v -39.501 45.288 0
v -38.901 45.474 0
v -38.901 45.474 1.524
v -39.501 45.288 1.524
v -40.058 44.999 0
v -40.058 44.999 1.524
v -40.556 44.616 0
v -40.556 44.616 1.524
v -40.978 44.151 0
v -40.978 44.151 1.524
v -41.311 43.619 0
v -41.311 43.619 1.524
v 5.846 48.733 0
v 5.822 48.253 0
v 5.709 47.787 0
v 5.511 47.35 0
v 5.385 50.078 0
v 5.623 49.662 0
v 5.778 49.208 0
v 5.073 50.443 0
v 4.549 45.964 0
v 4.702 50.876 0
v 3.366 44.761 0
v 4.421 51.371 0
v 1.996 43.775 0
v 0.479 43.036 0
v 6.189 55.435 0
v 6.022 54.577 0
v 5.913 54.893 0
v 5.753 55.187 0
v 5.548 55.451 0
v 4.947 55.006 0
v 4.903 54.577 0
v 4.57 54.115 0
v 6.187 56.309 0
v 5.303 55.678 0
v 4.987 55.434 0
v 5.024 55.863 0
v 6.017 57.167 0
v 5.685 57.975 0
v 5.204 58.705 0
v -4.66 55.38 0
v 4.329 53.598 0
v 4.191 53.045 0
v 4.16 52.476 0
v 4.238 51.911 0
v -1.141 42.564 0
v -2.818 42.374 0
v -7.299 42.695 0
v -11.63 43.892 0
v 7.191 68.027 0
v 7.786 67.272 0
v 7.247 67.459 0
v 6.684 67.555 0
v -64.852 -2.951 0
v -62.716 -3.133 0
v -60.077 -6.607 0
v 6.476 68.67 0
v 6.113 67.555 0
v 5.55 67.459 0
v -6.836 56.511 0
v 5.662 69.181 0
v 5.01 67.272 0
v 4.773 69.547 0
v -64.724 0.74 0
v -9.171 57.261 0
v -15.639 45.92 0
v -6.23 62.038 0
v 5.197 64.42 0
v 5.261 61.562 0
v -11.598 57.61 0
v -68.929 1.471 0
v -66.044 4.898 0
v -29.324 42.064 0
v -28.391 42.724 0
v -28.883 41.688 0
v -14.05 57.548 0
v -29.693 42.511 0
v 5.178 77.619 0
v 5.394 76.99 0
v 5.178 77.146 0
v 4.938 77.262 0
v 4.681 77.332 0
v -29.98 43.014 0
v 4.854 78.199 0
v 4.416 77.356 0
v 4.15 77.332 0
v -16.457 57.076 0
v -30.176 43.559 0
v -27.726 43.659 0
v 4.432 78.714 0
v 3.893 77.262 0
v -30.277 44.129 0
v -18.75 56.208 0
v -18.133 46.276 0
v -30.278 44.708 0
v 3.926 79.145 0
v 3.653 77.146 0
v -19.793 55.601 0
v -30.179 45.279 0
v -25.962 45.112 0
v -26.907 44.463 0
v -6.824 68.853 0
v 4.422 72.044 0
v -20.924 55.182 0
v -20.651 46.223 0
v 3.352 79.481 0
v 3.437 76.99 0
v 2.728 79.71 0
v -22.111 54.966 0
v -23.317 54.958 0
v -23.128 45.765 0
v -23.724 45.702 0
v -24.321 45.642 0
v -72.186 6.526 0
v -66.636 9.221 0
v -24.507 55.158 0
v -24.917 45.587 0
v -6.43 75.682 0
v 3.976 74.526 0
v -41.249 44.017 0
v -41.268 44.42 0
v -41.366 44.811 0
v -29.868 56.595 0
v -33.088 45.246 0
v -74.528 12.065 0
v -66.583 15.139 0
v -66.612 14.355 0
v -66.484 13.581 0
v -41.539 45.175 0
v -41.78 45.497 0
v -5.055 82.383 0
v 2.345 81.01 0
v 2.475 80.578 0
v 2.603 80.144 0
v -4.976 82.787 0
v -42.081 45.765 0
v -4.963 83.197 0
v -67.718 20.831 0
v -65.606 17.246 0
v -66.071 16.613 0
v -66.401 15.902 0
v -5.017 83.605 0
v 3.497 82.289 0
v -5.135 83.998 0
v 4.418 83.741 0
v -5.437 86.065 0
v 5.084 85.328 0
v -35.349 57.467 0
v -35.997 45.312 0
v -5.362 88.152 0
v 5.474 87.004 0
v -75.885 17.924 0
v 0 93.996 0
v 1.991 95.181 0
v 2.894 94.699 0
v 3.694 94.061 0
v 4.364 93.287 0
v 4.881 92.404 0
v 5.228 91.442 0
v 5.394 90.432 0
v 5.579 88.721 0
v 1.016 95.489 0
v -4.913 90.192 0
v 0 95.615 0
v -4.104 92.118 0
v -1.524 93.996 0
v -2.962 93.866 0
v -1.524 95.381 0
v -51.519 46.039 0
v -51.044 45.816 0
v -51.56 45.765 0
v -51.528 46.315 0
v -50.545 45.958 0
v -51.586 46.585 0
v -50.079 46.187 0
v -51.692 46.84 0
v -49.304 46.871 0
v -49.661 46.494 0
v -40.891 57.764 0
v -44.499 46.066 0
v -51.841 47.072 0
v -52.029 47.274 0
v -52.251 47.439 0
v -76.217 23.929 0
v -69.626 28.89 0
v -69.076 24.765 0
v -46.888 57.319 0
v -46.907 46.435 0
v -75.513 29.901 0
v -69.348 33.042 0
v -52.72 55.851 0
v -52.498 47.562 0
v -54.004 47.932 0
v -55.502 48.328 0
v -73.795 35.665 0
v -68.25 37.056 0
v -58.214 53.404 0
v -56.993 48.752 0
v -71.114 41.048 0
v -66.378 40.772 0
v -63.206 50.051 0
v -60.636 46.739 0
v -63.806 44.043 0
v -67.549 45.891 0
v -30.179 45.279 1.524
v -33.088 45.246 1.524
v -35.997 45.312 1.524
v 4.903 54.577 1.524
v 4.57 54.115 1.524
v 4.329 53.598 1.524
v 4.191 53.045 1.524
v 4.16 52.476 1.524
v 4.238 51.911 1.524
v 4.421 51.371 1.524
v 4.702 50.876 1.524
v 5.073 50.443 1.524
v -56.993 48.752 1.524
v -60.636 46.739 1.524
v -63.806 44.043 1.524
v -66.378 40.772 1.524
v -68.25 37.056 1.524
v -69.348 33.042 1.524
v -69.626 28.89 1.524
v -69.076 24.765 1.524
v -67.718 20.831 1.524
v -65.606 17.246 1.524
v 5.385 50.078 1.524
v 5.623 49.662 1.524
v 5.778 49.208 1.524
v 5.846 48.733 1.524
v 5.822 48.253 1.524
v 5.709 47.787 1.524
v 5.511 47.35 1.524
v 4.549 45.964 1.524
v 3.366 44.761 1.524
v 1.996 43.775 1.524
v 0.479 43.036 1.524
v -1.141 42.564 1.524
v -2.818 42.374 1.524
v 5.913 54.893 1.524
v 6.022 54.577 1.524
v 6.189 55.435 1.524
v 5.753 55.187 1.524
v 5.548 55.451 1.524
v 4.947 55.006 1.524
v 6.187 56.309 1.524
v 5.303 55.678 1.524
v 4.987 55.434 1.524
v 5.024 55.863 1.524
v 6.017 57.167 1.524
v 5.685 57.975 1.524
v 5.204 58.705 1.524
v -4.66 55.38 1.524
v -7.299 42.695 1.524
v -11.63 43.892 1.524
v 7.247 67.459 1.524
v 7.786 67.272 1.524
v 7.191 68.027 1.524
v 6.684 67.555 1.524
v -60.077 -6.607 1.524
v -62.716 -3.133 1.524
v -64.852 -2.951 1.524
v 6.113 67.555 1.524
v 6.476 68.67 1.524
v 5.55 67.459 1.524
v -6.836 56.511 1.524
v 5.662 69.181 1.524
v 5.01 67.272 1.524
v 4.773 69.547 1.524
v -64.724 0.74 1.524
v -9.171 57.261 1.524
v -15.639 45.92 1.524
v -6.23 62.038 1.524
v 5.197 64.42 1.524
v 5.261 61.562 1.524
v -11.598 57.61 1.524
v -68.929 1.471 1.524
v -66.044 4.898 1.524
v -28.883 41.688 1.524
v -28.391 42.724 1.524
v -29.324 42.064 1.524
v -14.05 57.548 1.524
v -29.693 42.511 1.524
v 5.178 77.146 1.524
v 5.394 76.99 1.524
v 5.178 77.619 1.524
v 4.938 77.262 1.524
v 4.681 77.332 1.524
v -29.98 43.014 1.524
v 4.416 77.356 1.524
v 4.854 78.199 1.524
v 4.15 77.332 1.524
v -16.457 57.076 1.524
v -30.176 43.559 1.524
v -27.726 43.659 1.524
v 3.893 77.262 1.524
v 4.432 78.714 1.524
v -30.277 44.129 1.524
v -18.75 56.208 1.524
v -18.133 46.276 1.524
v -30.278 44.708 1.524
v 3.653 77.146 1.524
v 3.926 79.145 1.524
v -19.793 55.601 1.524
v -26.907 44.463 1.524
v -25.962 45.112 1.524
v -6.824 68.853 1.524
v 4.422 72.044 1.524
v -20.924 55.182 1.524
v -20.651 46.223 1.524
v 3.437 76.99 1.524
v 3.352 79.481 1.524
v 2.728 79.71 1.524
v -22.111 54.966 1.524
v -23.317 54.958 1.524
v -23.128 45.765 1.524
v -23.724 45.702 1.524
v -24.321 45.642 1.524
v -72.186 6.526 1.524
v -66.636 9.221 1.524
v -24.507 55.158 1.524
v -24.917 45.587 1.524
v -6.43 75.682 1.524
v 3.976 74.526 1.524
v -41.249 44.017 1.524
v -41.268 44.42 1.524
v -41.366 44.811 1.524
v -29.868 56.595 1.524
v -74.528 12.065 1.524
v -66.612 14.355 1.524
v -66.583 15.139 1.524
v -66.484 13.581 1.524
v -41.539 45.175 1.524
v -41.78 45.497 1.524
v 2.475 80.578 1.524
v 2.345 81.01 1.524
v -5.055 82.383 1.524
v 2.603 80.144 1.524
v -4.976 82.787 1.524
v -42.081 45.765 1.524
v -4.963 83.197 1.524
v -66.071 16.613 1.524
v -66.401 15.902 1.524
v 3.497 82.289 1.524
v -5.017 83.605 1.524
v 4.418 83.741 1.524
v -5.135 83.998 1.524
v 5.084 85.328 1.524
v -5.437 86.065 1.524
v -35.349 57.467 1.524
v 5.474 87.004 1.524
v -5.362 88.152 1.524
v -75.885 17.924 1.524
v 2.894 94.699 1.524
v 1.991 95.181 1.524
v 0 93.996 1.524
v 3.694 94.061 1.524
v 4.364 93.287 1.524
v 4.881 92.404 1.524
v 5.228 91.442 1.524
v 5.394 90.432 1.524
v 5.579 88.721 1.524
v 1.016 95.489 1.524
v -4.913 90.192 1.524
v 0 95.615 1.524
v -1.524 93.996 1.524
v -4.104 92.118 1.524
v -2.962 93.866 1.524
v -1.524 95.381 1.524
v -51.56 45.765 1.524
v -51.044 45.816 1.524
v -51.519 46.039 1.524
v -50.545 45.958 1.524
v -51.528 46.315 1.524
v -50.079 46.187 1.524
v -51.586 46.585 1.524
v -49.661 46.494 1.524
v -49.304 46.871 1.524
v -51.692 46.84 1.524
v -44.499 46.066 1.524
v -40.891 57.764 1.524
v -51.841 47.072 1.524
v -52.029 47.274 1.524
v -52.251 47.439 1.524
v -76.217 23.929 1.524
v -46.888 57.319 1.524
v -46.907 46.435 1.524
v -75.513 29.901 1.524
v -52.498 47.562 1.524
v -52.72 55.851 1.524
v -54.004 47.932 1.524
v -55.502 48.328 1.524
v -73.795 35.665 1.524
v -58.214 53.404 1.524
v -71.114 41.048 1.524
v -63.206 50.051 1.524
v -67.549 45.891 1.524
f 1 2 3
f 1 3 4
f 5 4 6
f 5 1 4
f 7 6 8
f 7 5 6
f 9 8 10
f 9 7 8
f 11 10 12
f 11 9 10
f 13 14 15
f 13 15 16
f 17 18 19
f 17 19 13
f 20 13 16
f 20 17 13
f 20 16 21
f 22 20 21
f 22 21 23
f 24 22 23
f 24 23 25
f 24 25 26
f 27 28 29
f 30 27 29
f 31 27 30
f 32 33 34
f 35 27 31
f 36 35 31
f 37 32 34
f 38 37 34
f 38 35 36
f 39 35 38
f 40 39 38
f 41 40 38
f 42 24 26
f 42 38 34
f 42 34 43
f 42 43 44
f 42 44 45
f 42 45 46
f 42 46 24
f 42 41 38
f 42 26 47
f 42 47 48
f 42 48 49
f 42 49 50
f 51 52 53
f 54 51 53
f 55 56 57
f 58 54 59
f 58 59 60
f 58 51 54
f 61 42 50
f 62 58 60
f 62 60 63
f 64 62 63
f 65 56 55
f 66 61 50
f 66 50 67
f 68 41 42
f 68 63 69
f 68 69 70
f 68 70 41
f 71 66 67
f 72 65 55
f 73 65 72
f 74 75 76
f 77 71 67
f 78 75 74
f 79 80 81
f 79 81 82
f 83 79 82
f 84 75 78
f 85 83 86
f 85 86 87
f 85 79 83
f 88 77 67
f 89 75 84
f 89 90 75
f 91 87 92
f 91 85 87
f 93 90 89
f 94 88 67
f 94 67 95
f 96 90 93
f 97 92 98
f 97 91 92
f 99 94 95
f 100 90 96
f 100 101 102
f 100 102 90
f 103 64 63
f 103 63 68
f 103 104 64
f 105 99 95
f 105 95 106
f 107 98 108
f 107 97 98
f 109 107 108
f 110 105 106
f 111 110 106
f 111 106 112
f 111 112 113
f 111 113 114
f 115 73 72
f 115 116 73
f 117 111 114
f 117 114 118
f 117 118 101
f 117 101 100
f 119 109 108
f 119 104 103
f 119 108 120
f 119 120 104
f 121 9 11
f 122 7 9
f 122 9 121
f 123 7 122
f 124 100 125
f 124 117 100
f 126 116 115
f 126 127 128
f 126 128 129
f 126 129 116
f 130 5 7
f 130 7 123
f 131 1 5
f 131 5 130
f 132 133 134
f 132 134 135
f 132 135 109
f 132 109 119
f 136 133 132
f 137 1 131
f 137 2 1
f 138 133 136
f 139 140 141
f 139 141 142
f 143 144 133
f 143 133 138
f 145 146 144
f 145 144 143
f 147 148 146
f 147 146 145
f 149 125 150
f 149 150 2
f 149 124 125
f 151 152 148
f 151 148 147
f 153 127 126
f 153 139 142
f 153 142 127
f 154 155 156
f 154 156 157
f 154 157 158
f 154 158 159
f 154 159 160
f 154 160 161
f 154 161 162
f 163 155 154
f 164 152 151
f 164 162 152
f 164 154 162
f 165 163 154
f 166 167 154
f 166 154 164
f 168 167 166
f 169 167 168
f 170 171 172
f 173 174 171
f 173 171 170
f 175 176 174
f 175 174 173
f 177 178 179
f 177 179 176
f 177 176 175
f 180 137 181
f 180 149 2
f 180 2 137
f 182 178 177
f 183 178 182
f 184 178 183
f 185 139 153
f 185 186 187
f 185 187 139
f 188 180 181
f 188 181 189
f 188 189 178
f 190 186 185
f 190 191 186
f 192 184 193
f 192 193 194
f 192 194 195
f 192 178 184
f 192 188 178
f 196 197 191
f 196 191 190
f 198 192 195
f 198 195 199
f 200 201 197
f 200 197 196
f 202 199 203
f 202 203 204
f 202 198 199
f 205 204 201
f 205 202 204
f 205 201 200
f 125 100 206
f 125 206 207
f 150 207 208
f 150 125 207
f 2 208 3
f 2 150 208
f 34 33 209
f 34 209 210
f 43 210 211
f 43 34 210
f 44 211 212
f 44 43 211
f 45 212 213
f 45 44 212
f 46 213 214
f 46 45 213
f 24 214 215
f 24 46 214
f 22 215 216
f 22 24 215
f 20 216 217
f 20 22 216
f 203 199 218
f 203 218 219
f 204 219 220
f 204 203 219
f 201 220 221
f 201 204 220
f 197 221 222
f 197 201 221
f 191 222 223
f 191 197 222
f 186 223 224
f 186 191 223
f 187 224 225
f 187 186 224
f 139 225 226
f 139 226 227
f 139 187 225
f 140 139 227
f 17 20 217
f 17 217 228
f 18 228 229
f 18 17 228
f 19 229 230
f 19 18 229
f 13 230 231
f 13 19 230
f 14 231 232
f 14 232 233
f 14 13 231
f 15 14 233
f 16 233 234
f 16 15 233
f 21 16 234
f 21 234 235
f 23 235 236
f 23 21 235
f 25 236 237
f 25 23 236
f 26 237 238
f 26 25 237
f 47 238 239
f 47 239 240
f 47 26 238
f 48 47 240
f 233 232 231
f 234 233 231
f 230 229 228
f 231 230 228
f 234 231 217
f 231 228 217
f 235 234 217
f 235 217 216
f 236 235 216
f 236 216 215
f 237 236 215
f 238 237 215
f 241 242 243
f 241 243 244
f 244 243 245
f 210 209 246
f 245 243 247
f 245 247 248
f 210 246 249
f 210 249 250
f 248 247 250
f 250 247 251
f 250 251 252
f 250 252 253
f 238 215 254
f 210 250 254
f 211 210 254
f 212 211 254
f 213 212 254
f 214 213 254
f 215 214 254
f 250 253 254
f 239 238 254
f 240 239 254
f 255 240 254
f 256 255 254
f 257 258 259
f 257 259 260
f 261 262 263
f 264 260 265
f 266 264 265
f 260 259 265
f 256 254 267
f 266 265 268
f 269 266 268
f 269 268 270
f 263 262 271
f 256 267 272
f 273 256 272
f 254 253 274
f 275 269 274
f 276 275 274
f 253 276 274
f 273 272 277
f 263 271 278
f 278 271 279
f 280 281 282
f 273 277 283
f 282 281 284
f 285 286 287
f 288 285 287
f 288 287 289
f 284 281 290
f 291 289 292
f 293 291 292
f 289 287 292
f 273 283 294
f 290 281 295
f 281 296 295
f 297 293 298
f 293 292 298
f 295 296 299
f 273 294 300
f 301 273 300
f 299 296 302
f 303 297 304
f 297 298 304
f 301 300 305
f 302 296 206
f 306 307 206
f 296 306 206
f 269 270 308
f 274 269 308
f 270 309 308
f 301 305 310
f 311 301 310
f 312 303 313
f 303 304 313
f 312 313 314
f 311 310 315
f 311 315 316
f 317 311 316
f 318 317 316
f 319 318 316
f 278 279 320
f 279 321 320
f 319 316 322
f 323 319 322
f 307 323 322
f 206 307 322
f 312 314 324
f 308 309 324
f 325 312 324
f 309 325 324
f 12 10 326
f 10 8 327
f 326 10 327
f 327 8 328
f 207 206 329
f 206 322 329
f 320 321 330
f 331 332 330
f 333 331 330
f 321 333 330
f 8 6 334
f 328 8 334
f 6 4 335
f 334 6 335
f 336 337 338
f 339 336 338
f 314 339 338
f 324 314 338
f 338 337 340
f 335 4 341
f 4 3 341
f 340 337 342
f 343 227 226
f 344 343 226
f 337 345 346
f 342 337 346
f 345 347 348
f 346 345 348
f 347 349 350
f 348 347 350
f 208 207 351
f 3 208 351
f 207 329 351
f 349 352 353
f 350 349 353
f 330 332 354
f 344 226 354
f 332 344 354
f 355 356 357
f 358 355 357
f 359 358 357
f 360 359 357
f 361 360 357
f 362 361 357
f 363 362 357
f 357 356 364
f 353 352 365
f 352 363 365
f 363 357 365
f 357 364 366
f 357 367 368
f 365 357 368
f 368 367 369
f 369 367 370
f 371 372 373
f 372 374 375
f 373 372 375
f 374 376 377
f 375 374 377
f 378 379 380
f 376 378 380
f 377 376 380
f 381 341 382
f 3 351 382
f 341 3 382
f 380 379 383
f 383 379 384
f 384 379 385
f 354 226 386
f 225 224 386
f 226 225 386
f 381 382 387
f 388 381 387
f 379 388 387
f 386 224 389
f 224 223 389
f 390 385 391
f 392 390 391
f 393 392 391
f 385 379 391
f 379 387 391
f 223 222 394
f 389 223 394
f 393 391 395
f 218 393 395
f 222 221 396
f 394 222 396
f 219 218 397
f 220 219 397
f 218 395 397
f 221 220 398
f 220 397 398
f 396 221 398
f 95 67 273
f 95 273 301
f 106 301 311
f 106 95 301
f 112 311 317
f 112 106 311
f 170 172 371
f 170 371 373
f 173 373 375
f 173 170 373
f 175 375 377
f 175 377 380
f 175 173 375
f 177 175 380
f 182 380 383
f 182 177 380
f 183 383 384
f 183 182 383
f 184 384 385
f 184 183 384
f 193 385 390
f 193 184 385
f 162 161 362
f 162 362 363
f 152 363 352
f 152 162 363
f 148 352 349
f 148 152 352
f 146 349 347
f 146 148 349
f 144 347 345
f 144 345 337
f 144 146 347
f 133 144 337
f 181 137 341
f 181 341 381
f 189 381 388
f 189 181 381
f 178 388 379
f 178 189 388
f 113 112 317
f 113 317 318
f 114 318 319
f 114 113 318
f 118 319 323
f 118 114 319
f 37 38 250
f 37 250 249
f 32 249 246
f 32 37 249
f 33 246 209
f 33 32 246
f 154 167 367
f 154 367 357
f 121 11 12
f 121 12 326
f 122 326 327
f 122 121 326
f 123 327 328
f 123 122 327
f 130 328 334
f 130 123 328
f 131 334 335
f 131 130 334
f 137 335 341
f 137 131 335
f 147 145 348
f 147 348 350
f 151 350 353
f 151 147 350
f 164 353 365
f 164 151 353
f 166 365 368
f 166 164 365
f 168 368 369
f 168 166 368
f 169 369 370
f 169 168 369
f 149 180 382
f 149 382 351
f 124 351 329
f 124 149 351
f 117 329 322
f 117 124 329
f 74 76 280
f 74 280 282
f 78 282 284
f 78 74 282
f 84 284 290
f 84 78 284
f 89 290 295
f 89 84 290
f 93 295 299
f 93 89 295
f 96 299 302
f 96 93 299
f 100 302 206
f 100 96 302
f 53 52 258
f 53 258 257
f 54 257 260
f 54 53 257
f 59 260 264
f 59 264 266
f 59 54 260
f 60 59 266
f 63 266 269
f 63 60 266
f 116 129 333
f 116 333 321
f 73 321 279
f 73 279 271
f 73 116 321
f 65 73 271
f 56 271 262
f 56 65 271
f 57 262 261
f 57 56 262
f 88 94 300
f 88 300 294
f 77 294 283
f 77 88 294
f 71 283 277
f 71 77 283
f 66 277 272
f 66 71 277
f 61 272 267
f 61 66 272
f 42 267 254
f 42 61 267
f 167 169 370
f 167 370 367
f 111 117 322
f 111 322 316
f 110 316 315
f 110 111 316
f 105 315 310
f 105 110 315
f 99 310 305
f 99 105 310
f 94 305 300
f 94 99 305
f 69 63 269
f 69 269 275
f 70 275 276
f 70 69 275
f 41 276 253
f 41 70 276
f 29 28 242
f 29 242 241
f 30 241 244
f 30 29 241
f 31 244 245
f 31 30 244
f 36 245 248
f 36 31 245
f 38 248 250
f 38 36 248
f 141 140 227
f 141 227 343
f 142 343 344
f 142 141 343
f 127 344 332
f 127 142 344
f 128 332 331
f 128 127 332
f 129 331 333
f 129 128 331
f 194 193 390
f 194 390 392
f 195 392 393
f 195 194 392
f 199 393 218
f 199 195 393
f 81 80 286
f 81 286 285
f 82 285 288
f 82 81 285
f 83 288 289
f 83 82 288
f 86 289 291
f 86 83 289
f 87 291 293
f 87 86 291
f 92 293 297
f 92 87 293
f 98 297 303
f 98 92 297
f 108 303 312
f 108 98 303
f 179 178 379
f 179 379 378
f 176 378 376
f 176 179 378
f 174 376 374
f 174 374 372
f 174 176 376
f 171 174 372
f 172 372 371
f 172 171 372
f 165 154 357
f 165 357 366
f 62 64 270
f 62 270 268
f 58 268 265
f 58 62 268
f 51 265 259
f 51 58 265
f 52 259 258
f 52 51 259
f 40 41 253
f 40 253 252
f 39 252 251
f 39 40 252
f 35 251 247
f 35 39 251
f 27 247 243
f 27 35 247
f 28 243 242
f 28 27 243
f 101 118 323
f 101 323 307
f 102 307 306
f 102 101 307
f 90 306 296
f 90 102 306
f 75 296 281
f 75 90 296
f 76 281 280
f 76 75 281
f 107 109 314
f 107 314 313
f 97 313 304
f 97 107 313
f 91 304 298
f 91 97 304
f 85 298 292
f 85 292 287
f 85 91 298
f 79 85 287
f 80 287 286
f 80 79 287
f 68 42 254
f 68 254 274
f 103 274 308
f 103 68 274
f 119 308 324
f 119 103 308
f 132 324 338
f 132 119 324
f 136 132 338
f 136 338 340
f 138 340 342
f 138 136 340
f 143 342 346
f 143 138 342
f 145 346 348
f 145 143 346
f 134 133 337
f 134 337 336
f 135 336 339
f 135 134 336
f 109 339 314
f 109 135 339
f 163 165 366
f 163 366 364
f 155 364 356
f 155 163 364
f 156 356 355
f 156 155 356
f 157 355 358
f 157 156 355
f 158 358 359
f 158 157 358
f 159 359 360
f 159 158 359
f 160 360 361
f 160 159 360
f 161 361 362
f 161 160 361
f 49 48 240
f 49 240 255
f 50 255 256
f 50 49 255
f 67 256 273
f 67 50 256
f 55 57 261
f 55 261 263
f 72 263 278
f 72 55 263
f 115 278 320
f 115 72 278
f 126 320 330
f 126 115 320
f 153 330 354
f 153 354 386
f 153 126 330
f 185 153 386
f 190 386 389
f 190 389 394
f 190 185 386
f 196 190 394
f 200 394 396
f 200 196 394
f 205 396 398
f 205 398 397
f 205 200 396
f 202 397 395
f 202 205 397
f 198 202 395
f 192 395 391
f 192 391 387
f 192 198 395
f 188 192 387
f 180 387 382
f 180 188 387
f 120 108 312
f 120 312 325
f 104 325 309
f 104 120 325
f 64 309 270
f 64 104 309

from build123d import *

# Parameters (mm, degrees)
BOSS_EXTRUDE1_DEPTH = 1.524


with BuildPart() as part:
    # Sketch1 → Boss-Extrude1 (new body)
    with BuildSketch(Plane.XY):
        with BuildLine():
            Line((-1.524, 93.996264428), (0, 93.996264428))
            Line((0, 93.996264428), (0, 95.614927588))
            ThreePointArc((0, 95.614927588), (3.693748092, 94.060684173), (5.394313408, 90.431975702))
            ThreePointArc((5.394313408, 90.431975702), (5.083870366, 85.328096728), (2.344513216, 81.010472628))
            ThreePointArc((2.344513216, 81.010472628), (2.539372179, 80.361029228), (2.727630661, 79.709641871))
            ThreePointArc((2.727630661, 79.709641871), (4.432053028, 78.713510624), (5.394313408, 76.989739169))
            ThreePointArc((5.394313408, 76.989739169), (4.415817963, 77.356115064), (3.437322519, 76.989739169))
            ThreePointArc((3.437322519, 76.989739169), (4.210597619, 73.287177771), (4.773115775, 69.546791613))
            ThreePointArc((4.773115775, 69.546791613), (6.476278237, 68.669820648), (7.786173006, 67.271959374))
            ThreePointArc((7.786173006, 67.271959374), (6.398187856, 67.566469165), (5.010202706, 67.271959374))
            ThreePointArc((5.010202706, 67.271959374), (5.244344787, 62.991455343), (5.203509677, 58.704746843))
            ThreePointArc((5.203509677, 58.704746843), (6.122995482, 56.742128292), (6.022449708, 54.577130307))
            ThreePointArc((6.022449708, 54.577130307), (5.656055769, 55.32299802), (5.02447468, 55.863061433))
            ThreePointArc((5.02447468, 55.863061433), (4.967033142, 55.219803245), (4.903376867, 54.577130307))
            ThreePointArc((4.903376867, 54.577130307), (4.160208316, 52.476052404), (5.072854771, 50.442851897))
            ThreePointArc((5.072854771, 50.442851897), (5.82334848, 48.971843275), (5.510783631, 47.350297597))
            ThreePointArc((5.510783631, 47.350297597), (1.996073925, 43.775155466), (-2.817678827, 42.374223627))
            ThreePointArc((-2.817678827, 42.374223627), (-9.49417325, 43.186036631), (-15.638900273, 45.92043747))
            ThreePointArc((-15.638900273, 45.92043747), (-19.39296862, 46.30049438), (-23.12808354, 45.765341186))
            ThreePointArc((-23.12808354, 45.765341186), (-24.022277431, 45.671562771), (-24.917397051, 45.587076243))
            ThreePointArc((-24.917397051, 45.587076243), (-27.334149164, 44.07870078), (-28.883355756, 41.687917174))
            ThreePointArc((-28.883355756, 41.687917174), (-30.089948499, 43.281908325), (-30.179098122, 45.279087881))
            ThreePointArc((-30.179098122, 45.279087881), (-34.542573171, 45.266801777), (-38.901124358, 45.474399945))
            ThreePointArc((-38.901124358, 45.474399945), (-40.315710263, 44.818959656), (-41.31100161, 43.61893866))
            ThreePointArc((-41.31100161, 43.61893866), (-41.365656867, 44.810730455), (-42.081209312, 45.765371529))
            ThreePointArc((-42.081209312, 45.765371529), (-45.704386877, 46.241994184), (-49.304220896, 46.871104556))
            ThreePointArc((-49.304220896, 46.871104556), (-50.306617349, 46.062069726), (-51.560134873, 45.765371529))
            ThreePointArc((-51.560134873, 45.765371529), (-51.69154215, 46.839952524), (-52.498251339, 47.561902989))
            ThreePointArc((-52.498251339, 47.561902989), (-54.753856575, 48.126581404), (-56.993482586, 48.751635021))
            ThreePointArc((-56.993482586, 48.751635021), (-68.899192265, 35.07600442), (-65.606179776, 17.245556751))
            ThreePointArc((-65.606179776, 17.245556751), (-66.511011599, 15.524715569), (-66.48442613, 13.580671275))
            ThreePointArc((-66.48442613, 13.580671275), (-65.472964, 2.7909779), (-60.077247453, -6.607255003))
            ThreePointArc((-60.077247453, -6.607255003), (-74.778475075, 32.819889944), (-40.89052168, 57.764477873))
            ThreePointArc((-40.89052168, 57.764477873), (-32.596685646, 57.102075632), (-24.506779764, 55.157875102))
            ThreePointArc((-24.506779764, 55.157875102), (-21.512905256, 55.048508832), (-18.750408328, 56.207756982))
            ThreePointArc((-18.750408328, 56.207756982), (-11.598379652, 57.610020261), (-4.659613728, 55.380360214))
            ThreePointArc((-4.659613728, 55.380360214), (-6.824036174, 68.85301684), (-5.055416365, 82.38332301))
            ThreePointArc((-5.055416365, 82.38332301), (-4.963334277, 83.197390982), (-5.135176923, 83.998425237))
            ThreePointArc((-5.135176923, 83.998425237), (-4.912918532, 90.191927066), (-1.524, 95.380770374))
            Line((-1.524, 95.380770374), (-1.524, 93.996264428))
        make_face()
    extrude(amount=BOSS_EXTRUDE1_DEPTH)


solid = part.part
